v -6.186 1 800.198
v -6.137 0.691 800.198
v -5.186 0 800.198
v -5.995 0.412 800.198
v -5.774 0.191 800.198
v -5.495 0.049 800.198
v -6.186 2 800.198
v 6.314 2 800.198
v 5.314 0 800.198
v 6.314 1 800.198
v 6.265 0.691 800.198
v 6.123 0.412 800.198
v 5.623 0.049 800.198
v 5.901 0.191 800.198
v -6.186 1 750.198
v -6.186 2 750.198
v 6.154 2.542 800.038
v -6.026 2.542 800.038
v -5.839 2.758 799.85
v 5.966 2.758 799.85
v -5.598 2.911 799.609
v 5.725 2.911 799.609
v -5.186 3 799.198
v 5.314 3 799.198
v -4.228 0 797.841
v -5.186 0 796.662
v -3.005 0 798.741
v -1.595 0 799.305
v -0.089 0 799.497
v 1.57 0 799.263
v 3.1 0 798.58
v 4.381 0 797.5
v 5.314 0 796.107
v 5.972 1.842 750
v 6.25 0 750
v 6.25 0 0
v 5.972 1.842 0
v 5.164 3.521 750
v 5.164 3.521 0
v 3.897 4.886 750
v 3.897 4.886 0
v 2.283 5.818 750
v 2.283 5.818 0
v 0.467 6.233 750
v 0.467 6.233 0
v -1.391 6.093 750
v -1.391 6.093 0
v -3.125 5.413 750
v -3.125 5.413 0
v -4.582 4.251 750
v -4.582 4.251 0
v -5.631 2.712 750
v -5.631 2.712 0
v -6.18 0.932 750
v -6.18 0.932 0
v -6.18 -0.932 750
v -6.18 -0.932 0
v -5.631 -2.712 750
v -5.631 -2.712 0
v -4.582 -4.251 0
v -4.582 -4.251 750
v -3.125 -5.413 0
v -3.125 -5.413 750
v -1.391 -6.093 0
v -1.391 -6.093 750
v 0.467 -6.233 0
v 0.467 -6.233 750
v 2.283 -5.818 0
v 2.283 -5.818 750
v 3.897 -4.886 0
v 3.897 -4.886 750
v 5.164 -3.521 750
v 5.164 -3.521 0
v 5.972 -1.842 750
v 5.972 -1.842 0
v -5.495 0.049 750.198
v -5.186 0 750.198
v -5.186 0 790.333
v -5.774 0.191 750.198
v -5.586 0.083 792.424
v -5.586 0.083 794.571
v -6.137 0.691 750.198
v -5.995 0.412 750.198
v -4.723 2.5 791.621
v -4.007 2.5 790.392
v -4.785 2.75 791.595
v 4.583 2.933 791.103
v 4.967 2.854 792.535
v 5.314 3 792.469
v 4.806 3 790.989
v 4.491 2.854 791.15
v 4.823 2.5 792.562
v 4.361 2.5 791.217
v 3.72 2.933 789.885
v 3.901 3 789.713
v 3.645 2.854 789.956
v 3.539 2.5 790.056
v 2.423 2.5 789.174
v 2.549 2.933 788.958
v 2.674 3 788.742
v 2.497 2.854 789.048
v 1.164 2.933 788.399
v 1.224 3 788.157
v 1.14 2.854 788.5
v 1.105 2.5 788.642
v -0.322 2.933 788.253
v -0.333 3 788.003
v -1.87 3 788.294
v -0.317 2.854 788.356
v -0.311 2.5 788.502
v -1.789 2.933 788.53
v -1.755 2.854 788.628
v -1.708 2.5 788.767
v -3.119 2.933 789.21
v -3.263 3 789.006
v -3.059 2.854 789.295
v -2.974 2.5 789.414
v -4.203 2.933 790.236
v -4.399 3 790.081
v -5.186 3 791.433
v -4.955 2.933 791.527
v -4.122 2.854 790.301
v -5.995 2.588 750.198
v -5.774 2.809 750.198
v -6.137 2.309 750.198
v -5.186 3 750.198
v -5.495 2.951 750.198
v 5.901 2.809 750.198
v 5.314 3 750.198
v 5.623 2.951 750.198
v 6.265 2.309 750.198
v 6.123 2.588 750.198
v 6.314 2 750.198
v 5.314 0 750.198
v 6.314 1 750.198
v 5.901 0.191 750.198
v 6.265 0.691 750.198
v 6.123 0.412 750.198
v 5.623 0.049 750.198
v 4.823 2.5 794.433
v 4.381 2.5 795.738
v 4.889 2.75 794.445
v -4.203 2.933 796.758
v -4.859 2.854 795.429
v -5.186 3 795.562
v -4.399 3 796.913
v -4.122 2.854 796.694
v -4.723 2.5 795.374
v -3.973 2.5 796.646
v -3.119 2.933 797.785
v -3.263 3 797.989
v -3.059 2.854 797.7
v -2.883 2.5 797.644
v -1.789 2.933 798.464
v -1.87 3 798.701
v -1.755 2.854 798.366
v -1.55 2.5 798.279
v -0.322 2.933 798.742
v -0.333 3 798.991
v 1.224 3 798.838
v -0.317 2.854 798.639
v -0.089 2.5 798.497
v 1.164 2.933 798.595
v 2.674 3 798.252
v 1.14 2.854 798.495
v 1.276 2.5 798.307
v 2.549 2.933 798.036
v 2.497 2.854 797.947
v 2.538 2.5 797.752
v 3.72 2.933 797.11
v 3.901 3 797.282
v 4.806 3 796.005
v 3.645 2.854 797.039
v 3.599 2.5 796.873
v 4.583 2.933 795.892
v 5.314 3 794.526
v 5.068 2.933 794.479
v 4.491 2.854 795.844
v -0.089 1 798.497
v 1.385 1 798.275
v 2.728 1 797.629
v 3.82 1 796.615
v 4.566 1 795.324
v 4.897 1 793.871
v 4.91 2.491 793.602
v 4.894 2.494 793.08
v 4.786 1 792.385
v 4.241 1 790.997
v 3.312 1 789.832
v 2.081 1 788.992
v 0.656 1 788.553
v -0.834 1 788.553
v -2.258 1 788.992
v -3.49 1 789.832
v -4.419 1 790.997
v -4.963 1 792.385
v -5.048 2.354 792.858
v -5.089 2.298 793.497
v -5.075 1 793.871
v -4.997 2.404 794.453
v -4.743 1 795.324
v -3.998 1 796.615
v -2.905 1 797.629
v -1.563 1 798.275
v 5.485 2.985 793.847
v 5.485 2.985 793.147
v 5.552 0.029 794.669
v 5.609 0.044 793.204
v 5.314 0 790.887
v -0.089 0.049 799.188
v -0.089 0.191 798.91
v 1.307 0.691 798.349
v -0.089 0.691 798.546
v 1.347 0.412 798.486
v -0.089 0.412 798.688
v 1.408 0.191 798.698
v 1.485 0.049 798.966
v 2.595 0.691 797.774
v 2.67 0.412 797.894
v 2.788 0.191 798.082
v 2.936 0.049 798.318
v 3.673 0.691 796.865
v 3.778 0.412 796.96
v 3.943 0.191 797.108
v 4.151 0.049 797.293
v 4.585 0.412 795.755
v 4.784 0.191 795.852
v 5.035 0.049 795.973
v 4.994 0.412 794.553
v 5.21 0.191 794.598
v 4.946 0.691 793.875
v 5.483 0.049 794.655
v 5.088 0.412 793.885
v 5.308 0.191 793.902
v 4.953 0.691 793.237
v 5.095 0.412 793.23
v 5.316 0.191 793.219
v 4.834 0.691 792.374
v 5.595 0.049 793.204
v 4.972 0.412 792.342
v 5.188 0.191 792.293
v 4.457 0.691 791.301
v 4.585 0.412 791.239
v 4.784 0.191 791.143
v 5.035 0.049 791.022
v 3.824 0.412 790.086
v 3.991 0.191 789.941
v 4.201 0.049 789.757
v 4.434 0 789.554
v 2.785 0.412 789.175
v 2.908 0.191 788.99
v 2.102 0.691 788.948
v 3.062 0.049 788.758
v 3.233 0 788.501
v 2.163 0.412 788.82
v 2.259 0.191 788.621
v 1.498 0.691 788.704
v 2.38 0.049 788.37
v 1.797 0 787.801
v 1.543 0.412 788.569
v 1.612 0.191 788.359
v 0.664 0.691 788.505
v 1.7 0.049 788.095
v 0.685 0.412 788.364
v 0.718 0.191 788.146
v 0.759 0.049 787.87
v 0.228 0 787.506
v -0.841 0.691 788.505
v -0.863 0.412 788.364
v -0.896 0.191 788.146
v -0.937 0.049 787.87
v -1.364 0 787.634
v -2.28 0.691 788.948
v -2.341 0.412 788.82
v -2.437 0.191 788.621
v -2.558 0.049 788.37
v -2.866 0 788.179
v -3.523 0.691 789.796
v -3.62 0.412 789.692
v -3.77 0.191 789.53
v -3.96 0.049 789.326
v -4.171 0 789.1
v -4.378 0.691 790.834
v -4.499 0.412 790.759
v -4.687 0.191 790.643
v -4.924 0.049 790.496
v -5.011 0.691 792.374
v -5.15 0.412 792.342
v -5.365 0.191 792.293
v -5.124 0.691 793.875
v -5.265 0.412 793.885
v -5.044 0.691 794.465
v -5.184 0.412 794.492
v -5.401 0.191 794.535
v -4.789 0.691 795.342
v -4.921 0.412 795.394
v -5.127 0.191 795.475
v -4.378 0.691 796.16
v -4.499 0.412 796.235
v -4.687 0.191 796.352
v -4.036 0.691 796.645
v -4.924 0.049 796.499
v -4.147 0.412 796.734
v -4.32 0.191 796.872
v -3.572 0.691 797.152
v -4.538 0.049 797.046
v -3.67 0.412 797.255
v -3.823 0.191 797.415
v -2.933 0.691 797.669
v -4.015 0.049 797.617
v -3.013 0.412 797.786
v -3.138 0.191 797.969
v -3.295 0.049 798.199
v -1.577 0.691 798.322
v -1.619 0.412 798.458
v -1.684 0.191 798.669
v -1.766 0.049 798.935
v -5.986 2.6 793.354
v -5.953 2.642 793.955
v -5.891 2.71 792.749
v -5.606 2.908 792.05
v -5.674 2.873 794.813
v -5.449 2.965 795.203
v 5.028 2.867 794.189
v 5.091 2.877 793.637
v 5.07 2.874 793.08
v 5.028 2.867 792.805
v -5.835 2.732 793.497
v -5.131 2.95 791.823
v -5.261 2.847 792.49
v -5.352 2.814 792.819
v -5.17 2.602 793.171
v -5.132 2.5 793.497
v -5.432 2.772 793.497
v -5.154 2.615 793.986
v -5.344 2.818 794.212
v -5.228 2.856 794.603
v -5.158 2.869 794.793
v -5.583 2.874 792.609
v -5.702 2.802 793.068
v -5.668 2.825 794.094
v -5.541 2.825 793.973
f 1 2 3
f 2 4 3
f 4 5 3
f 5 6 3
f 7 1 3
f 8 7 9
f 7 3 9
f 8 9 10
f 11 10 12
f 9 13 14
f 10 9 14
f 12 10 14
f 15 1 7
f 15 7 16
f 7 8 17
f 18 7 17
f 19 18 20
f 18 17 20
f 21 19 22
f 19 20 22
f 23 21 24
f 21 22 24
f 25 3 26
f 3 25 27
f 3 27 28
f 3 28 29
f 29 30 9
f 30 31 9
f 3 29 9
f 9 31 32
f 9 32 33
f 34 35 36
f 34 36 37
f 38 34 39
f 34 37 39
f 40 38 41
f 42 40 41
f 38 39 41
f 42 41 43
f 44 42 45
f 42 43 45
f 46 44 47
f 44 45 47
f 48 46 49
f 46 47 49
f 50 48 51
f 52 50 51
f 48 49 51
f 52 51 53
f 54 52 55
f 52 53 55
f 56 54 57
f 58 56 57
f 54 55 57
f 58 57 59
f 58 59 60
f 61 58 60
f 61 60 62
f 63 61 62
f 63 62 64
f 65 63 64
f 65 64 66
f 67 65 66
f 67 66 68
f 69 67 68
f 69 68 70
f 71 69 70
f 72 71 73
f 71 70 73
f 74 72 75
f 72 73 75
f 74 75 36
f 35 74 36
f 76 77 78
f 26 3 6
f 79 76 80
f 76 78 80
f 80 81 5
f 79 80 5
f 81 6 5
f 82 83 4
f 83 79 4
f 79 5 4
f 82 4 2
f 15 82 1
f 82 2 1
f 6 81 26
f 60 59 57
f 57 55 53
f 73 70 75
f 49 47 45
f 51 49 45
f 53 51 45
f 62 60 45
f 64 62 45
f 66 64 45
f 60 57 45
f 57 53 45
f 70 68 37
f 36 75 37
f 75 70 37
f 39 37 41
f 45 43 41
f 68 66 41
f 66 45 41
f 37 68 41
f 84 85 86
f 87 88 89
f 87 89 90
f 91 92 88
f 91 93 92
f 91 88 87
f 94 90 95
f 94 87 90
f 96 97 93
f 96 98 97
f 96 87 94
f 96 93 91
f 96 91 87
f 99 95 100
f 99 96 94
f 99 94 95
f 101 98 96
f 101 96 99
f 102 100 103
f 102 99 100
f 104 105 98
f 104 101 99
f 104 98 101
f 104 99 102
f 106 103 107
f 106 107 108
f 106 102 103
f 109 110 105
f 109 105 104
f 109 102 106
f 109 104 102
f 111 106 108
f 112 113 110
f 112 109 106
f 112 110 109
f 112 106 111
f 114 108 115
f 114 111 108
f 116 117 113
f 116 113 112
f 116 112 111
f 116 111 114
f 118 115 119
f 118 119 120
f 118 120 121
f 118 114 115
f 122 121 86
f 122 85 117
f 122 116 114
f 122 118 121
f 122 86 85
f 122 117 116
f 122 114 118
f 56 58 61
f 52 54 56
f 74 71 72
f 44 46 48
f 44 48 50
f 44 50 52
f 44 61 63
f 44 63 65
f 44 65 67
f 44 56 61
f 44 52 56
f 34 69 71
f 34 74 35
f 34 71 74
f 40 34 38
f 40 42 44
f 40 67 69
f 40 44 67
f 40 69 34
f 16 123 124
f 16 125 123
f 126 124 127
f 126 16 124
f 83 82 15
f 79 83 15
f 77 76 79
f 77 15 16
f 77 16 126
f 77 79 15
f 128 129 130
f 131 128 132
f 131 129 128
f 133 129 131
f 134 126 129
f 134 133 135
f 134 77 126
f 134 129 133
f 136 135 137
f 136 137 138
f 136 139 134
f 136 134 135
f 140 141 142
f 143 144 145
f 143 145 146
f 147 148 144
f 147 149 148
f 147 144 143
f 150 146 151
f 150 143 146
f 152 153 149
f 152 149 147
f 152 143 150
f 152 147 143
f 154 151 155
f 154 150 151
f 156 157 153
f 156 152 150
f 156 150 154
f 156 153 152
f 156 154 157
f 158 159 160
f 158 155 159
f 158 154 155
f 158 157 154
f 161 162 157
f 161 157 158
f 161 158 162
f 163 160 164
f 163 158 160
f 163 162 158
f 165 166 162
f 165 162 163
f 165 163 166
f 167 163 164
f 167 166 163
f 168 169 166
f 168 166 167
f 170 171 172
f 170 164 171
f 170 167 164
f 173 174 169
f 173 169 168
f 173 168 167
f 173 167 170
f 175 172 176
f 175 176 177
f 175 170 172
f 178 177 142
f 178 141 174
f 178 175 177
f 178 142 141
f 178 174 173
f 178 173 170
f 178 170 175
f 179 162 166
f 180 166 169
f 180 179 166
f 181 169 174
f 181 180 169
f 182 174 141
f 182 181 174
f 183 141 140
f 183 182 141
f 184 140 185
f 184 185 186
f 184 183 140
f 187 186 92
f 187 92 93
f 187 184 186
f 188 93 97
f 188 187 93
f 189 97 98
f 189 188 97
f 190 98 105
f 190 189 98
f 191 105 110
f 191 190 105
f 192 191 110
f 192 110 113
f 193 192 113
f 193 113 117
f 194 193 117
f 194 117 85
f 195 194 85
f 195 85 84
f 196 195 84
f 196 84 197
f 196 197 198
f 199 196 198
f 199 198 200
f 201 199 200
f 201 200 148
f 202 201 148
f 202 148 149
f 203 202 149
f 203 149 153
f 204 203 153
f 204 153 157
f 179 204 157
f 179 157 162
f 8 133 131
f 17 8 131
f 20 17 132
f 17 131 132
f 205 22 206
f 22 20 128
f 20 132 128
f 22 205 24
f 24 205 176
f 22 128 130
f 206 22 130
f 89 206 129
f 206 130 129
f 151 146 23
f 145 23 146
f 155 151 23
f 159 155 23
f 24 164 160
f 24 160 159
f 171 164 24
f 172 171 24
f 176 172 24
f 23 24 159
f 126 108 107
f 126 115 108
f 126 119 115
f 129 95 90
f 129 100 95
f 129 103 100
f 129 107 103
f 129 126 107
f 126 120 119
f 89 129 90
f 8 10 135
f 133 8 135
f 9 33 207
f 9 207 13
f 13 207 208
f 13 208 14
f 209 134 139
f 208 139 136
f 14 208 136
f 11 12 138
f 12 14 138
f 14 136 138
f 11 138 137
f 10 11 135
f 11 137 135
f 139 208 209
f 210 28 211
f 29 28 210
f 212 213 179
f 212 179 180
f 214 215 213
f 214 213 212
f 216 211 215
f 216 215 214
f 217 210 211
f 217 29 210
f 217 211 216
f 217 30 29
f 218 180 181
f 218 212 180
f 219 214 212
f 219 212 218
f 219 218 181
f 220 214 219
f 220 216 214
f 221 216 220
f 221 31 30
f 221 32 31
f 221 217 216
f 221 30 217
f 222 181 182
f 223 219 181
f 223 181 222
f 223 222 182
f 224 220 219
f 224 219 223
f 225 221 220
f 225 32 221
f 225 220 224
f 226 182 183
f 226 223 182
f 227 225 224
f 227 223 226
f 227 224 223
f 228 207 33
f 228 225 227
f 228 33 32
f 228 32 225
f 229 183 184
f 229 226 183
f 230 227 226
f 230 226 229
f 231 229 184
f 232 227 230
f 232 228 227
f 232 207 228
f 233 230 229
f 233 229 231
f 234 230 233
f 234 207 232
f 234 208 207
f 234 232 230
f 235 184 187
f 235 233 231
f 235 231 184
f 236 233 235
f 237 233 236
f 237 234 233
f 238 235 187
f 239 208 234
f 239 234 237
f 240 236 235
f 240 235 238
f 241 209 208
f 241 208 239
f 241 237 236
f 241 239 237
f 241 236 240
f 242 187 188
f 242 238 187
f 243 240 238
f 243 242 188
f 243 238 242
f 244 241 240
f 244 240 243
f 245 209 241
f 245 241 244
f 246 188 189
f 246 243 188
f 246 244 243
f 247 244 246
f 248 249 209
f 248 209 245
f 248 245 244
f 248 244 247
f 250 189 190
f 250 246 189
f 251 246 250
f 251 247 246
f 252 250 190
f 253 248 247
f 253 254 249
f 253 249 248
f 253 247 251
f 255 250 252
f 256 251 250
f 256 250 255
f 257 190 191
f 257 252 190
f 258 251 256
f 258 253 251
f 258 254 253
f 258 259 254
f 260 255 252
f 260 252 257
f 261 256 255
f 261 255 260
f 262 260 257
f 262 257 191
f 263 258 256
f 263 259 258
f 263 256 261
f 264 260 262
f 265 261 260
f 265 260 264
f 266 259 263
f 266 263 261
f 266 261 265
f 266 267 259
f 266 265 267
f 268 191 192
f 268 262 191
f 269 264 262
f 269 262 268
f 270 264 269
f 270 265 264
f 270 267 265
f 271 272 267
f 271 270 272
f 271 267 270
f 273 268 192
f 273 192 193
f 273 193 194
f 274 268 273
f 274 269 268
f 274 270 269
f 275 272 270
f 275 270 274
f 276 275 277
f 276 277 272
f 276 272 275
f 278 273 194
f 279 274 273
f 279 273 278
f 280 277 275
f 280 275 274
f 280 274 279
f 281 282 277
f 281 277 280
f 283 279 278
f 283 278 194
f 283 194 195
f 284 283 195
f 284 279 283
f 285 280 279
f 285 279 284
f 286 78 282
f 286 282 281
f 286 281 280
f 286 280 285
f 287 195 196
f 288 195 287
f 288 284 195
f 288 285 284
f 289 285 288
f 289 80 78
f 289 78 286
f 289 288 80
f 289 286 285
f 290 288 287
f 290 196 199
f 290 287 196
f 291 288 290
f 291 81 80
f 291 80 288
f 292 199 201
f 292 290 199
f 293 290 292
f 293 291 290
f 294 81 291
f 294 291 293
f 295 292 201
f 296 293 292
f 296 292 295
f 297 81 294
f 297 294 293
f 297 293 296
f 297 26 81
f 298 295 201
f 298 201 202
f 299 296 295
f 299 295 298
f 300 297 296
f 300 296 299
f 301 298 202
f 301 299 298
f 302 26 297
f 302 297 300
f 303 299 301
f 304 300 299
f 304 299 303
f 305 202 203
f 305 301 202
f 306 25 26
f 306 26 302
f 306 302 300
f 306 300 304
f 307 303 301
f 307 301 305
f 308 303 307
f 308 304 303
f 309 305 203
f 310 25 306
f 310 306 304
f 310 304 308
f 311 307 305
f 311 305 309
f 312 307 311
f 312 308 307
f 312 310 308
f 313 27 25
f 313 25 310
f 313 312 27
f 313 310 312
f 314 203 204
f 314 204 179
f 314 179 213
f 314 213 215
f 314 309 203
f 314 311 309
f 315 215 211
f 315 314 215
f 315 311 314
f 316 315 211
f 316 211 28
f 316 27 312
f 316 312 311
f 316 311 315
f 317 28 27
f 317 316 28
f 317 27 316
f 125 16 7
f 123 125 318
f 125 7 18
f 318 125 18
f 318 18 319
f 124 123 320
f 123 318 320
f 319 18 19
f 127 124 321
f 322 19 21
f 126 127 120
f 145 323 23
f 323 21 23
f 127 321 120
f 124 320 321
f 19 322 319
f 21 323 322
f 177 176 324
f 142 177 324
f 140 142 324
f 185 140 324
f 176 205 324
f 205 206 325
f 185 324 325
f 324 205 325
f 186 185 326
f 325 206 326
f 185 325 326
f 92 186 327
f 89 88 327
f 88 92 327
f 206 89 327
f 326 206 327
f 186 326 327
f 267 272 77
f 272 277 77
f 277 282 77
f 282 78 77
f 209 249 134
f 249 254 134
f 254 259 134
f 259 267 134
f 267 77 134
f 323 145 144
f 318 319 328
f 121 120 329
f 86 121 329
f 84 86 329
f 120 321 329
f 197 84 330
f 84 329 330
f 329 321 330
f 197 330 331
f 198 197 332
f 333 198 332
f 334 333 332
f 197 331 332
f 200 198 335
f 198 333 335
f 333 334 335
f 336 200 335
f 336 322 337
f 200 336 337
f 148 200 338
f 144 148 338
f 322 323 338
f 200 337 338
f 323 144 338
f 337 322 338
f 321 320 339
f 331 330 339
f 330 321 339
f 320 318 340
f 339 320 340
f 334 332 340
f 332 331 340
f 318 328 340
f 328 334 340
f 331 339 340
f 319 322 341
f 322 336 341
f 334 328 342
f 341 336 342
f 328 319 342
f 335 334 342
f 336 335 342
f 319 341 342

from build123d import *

# Parameters (mm, degrees)
SKETCH1_R           = 6.25
BOSS_EXTRUDE1_DEPTH = 750
SKETCH9_W           = 12.5
SKETCH9_H           = 50
SKETCH9_R           = 5
BOSS_EXTRUDE5_DEPTH = 3
FILLET3_R           = 1
FILLET5_R           = 0.5


# Some blends are built 0.0001 mm under size
with BuildPart() as part:
    # Sketch1 → Boss-Extrude1 (new body)
    with BuildSketch(Plane.XY):
        Circle(SKETCH1_R)
    extrude(amount=BOSS_EXTRUDE1_DEPTH)


with BuildPart() as body_2:
    # Sketch9 → Boss-Extrude5 (new body)
    with BuildSketch(Plane(origin=(0, 0, 0), x_dir=(1, 0, 0), z_dir=(0, 1, 0))):
        with Locations((0.06367686, -775.197871661)):
            Rectangle(SKETCH9_W, SKETCH9_H)
        with Locations(Location((-0.088854364, -793.497307476, 0), (0, 0, 270))):
            Circle(SKETCH9_R, mode=Mode.SUBTRACT)
    extrude(amount=BOSS_EXTRUDE5_DEPTH)

    # Fillet3
    # the kernel refuses this fillet: 1 mm, written as the material it takes off along each edge
    with BuildSketch(Plane(origin=(-0.088854364, 0, 793.497307476), x_dir=(0, 0, 1), z_dir=(-1, 0, 0))) as fillet3_piece_1:
        with BuildLine():
            CenterArc((5 + FILLET3_R, FILLET3_R), FILLET3_R, 180, 90)
            Line((5 + FILLET3_R, 0), (5, 0))
            Line((5, 0), (5, FILLET3_R))
        make_face()
    revolve(axis=Axis((-0.088854364, 0, 793.497307476), (0, 1, 0)), mode=Mode.SUBTRACT)
    with BuildSketch(Plane(origin=(-6.18632314, 3, 802.697871661), x_dir=(0, -1, 0), z_dir=(0, 0, -1)), Plane(origin=(6.31367686, 3, 747.697871661), x_dir=(0, -1, 0), z_dir=(0, 0, 1))) as fillet3_piece_2:
        with BuildLine():
            CenterArc((FILLET3_R, -FILLET3_R), FILLET3_R, 90, 90)
            Line((0, -FILLET3_R), (0, 0))
            Line((0, 0), (FILLET3_R, 0))
        make_face()
    extrude(amount=55, mode=Mode.SUBTRACT)
    with BuildSketch(Plane(origin=(8.81367686, 3, 800.197871661), x_dir=(0, -1, 0), z_dir=(-1, 0, 0))) as fillet3_piece_3:
        with BuildLine():
            CenterArc((FILLET3_R, -FILLET3_R), FILLET3_R, 90, 90)
            Line((0, -FILLET3_R), (0, 0))
            Line((0, 0), (FILLET3_R, 0))
        make_face()
    extrude(amount=17.5, mode=Mode.SUBTRACT)
    with BuildSketch(Plane(origin=(-6.18632314, 0, 802.697871661), x_dir=(0, 1, 0), z_dir=(0, 0, -1)), Plane(origin=(6.31367686, 0, 747.697871661), x_dir=(0, 1, 0), z_dir=(0, 0, 1))) as fillet3_piece_4:
        with BuildLine():
            CenterArc((FILLET3_R, FILLET3_R), FILLET3_R, 180, 90)
            Line((0, FILLET3_R), (0, 0))
            Line((0, 0), (FILLET3_R, 0))
        make_face()
    extrude(amount=55, mode=Mode.SUBTRACT)

    # Fillet5
    fillet5_edges = [body_2.edges().sort_by_distance(p)[0] for p in [
        (-0.088854364, 3, 788.497307476),
    ]]
    fillet(fillet5_edges, radius=FILLET5_R - 0.0004)  # a hair under: the kernel refuses the full size


solid = Compound([part.part, body_2.part])
